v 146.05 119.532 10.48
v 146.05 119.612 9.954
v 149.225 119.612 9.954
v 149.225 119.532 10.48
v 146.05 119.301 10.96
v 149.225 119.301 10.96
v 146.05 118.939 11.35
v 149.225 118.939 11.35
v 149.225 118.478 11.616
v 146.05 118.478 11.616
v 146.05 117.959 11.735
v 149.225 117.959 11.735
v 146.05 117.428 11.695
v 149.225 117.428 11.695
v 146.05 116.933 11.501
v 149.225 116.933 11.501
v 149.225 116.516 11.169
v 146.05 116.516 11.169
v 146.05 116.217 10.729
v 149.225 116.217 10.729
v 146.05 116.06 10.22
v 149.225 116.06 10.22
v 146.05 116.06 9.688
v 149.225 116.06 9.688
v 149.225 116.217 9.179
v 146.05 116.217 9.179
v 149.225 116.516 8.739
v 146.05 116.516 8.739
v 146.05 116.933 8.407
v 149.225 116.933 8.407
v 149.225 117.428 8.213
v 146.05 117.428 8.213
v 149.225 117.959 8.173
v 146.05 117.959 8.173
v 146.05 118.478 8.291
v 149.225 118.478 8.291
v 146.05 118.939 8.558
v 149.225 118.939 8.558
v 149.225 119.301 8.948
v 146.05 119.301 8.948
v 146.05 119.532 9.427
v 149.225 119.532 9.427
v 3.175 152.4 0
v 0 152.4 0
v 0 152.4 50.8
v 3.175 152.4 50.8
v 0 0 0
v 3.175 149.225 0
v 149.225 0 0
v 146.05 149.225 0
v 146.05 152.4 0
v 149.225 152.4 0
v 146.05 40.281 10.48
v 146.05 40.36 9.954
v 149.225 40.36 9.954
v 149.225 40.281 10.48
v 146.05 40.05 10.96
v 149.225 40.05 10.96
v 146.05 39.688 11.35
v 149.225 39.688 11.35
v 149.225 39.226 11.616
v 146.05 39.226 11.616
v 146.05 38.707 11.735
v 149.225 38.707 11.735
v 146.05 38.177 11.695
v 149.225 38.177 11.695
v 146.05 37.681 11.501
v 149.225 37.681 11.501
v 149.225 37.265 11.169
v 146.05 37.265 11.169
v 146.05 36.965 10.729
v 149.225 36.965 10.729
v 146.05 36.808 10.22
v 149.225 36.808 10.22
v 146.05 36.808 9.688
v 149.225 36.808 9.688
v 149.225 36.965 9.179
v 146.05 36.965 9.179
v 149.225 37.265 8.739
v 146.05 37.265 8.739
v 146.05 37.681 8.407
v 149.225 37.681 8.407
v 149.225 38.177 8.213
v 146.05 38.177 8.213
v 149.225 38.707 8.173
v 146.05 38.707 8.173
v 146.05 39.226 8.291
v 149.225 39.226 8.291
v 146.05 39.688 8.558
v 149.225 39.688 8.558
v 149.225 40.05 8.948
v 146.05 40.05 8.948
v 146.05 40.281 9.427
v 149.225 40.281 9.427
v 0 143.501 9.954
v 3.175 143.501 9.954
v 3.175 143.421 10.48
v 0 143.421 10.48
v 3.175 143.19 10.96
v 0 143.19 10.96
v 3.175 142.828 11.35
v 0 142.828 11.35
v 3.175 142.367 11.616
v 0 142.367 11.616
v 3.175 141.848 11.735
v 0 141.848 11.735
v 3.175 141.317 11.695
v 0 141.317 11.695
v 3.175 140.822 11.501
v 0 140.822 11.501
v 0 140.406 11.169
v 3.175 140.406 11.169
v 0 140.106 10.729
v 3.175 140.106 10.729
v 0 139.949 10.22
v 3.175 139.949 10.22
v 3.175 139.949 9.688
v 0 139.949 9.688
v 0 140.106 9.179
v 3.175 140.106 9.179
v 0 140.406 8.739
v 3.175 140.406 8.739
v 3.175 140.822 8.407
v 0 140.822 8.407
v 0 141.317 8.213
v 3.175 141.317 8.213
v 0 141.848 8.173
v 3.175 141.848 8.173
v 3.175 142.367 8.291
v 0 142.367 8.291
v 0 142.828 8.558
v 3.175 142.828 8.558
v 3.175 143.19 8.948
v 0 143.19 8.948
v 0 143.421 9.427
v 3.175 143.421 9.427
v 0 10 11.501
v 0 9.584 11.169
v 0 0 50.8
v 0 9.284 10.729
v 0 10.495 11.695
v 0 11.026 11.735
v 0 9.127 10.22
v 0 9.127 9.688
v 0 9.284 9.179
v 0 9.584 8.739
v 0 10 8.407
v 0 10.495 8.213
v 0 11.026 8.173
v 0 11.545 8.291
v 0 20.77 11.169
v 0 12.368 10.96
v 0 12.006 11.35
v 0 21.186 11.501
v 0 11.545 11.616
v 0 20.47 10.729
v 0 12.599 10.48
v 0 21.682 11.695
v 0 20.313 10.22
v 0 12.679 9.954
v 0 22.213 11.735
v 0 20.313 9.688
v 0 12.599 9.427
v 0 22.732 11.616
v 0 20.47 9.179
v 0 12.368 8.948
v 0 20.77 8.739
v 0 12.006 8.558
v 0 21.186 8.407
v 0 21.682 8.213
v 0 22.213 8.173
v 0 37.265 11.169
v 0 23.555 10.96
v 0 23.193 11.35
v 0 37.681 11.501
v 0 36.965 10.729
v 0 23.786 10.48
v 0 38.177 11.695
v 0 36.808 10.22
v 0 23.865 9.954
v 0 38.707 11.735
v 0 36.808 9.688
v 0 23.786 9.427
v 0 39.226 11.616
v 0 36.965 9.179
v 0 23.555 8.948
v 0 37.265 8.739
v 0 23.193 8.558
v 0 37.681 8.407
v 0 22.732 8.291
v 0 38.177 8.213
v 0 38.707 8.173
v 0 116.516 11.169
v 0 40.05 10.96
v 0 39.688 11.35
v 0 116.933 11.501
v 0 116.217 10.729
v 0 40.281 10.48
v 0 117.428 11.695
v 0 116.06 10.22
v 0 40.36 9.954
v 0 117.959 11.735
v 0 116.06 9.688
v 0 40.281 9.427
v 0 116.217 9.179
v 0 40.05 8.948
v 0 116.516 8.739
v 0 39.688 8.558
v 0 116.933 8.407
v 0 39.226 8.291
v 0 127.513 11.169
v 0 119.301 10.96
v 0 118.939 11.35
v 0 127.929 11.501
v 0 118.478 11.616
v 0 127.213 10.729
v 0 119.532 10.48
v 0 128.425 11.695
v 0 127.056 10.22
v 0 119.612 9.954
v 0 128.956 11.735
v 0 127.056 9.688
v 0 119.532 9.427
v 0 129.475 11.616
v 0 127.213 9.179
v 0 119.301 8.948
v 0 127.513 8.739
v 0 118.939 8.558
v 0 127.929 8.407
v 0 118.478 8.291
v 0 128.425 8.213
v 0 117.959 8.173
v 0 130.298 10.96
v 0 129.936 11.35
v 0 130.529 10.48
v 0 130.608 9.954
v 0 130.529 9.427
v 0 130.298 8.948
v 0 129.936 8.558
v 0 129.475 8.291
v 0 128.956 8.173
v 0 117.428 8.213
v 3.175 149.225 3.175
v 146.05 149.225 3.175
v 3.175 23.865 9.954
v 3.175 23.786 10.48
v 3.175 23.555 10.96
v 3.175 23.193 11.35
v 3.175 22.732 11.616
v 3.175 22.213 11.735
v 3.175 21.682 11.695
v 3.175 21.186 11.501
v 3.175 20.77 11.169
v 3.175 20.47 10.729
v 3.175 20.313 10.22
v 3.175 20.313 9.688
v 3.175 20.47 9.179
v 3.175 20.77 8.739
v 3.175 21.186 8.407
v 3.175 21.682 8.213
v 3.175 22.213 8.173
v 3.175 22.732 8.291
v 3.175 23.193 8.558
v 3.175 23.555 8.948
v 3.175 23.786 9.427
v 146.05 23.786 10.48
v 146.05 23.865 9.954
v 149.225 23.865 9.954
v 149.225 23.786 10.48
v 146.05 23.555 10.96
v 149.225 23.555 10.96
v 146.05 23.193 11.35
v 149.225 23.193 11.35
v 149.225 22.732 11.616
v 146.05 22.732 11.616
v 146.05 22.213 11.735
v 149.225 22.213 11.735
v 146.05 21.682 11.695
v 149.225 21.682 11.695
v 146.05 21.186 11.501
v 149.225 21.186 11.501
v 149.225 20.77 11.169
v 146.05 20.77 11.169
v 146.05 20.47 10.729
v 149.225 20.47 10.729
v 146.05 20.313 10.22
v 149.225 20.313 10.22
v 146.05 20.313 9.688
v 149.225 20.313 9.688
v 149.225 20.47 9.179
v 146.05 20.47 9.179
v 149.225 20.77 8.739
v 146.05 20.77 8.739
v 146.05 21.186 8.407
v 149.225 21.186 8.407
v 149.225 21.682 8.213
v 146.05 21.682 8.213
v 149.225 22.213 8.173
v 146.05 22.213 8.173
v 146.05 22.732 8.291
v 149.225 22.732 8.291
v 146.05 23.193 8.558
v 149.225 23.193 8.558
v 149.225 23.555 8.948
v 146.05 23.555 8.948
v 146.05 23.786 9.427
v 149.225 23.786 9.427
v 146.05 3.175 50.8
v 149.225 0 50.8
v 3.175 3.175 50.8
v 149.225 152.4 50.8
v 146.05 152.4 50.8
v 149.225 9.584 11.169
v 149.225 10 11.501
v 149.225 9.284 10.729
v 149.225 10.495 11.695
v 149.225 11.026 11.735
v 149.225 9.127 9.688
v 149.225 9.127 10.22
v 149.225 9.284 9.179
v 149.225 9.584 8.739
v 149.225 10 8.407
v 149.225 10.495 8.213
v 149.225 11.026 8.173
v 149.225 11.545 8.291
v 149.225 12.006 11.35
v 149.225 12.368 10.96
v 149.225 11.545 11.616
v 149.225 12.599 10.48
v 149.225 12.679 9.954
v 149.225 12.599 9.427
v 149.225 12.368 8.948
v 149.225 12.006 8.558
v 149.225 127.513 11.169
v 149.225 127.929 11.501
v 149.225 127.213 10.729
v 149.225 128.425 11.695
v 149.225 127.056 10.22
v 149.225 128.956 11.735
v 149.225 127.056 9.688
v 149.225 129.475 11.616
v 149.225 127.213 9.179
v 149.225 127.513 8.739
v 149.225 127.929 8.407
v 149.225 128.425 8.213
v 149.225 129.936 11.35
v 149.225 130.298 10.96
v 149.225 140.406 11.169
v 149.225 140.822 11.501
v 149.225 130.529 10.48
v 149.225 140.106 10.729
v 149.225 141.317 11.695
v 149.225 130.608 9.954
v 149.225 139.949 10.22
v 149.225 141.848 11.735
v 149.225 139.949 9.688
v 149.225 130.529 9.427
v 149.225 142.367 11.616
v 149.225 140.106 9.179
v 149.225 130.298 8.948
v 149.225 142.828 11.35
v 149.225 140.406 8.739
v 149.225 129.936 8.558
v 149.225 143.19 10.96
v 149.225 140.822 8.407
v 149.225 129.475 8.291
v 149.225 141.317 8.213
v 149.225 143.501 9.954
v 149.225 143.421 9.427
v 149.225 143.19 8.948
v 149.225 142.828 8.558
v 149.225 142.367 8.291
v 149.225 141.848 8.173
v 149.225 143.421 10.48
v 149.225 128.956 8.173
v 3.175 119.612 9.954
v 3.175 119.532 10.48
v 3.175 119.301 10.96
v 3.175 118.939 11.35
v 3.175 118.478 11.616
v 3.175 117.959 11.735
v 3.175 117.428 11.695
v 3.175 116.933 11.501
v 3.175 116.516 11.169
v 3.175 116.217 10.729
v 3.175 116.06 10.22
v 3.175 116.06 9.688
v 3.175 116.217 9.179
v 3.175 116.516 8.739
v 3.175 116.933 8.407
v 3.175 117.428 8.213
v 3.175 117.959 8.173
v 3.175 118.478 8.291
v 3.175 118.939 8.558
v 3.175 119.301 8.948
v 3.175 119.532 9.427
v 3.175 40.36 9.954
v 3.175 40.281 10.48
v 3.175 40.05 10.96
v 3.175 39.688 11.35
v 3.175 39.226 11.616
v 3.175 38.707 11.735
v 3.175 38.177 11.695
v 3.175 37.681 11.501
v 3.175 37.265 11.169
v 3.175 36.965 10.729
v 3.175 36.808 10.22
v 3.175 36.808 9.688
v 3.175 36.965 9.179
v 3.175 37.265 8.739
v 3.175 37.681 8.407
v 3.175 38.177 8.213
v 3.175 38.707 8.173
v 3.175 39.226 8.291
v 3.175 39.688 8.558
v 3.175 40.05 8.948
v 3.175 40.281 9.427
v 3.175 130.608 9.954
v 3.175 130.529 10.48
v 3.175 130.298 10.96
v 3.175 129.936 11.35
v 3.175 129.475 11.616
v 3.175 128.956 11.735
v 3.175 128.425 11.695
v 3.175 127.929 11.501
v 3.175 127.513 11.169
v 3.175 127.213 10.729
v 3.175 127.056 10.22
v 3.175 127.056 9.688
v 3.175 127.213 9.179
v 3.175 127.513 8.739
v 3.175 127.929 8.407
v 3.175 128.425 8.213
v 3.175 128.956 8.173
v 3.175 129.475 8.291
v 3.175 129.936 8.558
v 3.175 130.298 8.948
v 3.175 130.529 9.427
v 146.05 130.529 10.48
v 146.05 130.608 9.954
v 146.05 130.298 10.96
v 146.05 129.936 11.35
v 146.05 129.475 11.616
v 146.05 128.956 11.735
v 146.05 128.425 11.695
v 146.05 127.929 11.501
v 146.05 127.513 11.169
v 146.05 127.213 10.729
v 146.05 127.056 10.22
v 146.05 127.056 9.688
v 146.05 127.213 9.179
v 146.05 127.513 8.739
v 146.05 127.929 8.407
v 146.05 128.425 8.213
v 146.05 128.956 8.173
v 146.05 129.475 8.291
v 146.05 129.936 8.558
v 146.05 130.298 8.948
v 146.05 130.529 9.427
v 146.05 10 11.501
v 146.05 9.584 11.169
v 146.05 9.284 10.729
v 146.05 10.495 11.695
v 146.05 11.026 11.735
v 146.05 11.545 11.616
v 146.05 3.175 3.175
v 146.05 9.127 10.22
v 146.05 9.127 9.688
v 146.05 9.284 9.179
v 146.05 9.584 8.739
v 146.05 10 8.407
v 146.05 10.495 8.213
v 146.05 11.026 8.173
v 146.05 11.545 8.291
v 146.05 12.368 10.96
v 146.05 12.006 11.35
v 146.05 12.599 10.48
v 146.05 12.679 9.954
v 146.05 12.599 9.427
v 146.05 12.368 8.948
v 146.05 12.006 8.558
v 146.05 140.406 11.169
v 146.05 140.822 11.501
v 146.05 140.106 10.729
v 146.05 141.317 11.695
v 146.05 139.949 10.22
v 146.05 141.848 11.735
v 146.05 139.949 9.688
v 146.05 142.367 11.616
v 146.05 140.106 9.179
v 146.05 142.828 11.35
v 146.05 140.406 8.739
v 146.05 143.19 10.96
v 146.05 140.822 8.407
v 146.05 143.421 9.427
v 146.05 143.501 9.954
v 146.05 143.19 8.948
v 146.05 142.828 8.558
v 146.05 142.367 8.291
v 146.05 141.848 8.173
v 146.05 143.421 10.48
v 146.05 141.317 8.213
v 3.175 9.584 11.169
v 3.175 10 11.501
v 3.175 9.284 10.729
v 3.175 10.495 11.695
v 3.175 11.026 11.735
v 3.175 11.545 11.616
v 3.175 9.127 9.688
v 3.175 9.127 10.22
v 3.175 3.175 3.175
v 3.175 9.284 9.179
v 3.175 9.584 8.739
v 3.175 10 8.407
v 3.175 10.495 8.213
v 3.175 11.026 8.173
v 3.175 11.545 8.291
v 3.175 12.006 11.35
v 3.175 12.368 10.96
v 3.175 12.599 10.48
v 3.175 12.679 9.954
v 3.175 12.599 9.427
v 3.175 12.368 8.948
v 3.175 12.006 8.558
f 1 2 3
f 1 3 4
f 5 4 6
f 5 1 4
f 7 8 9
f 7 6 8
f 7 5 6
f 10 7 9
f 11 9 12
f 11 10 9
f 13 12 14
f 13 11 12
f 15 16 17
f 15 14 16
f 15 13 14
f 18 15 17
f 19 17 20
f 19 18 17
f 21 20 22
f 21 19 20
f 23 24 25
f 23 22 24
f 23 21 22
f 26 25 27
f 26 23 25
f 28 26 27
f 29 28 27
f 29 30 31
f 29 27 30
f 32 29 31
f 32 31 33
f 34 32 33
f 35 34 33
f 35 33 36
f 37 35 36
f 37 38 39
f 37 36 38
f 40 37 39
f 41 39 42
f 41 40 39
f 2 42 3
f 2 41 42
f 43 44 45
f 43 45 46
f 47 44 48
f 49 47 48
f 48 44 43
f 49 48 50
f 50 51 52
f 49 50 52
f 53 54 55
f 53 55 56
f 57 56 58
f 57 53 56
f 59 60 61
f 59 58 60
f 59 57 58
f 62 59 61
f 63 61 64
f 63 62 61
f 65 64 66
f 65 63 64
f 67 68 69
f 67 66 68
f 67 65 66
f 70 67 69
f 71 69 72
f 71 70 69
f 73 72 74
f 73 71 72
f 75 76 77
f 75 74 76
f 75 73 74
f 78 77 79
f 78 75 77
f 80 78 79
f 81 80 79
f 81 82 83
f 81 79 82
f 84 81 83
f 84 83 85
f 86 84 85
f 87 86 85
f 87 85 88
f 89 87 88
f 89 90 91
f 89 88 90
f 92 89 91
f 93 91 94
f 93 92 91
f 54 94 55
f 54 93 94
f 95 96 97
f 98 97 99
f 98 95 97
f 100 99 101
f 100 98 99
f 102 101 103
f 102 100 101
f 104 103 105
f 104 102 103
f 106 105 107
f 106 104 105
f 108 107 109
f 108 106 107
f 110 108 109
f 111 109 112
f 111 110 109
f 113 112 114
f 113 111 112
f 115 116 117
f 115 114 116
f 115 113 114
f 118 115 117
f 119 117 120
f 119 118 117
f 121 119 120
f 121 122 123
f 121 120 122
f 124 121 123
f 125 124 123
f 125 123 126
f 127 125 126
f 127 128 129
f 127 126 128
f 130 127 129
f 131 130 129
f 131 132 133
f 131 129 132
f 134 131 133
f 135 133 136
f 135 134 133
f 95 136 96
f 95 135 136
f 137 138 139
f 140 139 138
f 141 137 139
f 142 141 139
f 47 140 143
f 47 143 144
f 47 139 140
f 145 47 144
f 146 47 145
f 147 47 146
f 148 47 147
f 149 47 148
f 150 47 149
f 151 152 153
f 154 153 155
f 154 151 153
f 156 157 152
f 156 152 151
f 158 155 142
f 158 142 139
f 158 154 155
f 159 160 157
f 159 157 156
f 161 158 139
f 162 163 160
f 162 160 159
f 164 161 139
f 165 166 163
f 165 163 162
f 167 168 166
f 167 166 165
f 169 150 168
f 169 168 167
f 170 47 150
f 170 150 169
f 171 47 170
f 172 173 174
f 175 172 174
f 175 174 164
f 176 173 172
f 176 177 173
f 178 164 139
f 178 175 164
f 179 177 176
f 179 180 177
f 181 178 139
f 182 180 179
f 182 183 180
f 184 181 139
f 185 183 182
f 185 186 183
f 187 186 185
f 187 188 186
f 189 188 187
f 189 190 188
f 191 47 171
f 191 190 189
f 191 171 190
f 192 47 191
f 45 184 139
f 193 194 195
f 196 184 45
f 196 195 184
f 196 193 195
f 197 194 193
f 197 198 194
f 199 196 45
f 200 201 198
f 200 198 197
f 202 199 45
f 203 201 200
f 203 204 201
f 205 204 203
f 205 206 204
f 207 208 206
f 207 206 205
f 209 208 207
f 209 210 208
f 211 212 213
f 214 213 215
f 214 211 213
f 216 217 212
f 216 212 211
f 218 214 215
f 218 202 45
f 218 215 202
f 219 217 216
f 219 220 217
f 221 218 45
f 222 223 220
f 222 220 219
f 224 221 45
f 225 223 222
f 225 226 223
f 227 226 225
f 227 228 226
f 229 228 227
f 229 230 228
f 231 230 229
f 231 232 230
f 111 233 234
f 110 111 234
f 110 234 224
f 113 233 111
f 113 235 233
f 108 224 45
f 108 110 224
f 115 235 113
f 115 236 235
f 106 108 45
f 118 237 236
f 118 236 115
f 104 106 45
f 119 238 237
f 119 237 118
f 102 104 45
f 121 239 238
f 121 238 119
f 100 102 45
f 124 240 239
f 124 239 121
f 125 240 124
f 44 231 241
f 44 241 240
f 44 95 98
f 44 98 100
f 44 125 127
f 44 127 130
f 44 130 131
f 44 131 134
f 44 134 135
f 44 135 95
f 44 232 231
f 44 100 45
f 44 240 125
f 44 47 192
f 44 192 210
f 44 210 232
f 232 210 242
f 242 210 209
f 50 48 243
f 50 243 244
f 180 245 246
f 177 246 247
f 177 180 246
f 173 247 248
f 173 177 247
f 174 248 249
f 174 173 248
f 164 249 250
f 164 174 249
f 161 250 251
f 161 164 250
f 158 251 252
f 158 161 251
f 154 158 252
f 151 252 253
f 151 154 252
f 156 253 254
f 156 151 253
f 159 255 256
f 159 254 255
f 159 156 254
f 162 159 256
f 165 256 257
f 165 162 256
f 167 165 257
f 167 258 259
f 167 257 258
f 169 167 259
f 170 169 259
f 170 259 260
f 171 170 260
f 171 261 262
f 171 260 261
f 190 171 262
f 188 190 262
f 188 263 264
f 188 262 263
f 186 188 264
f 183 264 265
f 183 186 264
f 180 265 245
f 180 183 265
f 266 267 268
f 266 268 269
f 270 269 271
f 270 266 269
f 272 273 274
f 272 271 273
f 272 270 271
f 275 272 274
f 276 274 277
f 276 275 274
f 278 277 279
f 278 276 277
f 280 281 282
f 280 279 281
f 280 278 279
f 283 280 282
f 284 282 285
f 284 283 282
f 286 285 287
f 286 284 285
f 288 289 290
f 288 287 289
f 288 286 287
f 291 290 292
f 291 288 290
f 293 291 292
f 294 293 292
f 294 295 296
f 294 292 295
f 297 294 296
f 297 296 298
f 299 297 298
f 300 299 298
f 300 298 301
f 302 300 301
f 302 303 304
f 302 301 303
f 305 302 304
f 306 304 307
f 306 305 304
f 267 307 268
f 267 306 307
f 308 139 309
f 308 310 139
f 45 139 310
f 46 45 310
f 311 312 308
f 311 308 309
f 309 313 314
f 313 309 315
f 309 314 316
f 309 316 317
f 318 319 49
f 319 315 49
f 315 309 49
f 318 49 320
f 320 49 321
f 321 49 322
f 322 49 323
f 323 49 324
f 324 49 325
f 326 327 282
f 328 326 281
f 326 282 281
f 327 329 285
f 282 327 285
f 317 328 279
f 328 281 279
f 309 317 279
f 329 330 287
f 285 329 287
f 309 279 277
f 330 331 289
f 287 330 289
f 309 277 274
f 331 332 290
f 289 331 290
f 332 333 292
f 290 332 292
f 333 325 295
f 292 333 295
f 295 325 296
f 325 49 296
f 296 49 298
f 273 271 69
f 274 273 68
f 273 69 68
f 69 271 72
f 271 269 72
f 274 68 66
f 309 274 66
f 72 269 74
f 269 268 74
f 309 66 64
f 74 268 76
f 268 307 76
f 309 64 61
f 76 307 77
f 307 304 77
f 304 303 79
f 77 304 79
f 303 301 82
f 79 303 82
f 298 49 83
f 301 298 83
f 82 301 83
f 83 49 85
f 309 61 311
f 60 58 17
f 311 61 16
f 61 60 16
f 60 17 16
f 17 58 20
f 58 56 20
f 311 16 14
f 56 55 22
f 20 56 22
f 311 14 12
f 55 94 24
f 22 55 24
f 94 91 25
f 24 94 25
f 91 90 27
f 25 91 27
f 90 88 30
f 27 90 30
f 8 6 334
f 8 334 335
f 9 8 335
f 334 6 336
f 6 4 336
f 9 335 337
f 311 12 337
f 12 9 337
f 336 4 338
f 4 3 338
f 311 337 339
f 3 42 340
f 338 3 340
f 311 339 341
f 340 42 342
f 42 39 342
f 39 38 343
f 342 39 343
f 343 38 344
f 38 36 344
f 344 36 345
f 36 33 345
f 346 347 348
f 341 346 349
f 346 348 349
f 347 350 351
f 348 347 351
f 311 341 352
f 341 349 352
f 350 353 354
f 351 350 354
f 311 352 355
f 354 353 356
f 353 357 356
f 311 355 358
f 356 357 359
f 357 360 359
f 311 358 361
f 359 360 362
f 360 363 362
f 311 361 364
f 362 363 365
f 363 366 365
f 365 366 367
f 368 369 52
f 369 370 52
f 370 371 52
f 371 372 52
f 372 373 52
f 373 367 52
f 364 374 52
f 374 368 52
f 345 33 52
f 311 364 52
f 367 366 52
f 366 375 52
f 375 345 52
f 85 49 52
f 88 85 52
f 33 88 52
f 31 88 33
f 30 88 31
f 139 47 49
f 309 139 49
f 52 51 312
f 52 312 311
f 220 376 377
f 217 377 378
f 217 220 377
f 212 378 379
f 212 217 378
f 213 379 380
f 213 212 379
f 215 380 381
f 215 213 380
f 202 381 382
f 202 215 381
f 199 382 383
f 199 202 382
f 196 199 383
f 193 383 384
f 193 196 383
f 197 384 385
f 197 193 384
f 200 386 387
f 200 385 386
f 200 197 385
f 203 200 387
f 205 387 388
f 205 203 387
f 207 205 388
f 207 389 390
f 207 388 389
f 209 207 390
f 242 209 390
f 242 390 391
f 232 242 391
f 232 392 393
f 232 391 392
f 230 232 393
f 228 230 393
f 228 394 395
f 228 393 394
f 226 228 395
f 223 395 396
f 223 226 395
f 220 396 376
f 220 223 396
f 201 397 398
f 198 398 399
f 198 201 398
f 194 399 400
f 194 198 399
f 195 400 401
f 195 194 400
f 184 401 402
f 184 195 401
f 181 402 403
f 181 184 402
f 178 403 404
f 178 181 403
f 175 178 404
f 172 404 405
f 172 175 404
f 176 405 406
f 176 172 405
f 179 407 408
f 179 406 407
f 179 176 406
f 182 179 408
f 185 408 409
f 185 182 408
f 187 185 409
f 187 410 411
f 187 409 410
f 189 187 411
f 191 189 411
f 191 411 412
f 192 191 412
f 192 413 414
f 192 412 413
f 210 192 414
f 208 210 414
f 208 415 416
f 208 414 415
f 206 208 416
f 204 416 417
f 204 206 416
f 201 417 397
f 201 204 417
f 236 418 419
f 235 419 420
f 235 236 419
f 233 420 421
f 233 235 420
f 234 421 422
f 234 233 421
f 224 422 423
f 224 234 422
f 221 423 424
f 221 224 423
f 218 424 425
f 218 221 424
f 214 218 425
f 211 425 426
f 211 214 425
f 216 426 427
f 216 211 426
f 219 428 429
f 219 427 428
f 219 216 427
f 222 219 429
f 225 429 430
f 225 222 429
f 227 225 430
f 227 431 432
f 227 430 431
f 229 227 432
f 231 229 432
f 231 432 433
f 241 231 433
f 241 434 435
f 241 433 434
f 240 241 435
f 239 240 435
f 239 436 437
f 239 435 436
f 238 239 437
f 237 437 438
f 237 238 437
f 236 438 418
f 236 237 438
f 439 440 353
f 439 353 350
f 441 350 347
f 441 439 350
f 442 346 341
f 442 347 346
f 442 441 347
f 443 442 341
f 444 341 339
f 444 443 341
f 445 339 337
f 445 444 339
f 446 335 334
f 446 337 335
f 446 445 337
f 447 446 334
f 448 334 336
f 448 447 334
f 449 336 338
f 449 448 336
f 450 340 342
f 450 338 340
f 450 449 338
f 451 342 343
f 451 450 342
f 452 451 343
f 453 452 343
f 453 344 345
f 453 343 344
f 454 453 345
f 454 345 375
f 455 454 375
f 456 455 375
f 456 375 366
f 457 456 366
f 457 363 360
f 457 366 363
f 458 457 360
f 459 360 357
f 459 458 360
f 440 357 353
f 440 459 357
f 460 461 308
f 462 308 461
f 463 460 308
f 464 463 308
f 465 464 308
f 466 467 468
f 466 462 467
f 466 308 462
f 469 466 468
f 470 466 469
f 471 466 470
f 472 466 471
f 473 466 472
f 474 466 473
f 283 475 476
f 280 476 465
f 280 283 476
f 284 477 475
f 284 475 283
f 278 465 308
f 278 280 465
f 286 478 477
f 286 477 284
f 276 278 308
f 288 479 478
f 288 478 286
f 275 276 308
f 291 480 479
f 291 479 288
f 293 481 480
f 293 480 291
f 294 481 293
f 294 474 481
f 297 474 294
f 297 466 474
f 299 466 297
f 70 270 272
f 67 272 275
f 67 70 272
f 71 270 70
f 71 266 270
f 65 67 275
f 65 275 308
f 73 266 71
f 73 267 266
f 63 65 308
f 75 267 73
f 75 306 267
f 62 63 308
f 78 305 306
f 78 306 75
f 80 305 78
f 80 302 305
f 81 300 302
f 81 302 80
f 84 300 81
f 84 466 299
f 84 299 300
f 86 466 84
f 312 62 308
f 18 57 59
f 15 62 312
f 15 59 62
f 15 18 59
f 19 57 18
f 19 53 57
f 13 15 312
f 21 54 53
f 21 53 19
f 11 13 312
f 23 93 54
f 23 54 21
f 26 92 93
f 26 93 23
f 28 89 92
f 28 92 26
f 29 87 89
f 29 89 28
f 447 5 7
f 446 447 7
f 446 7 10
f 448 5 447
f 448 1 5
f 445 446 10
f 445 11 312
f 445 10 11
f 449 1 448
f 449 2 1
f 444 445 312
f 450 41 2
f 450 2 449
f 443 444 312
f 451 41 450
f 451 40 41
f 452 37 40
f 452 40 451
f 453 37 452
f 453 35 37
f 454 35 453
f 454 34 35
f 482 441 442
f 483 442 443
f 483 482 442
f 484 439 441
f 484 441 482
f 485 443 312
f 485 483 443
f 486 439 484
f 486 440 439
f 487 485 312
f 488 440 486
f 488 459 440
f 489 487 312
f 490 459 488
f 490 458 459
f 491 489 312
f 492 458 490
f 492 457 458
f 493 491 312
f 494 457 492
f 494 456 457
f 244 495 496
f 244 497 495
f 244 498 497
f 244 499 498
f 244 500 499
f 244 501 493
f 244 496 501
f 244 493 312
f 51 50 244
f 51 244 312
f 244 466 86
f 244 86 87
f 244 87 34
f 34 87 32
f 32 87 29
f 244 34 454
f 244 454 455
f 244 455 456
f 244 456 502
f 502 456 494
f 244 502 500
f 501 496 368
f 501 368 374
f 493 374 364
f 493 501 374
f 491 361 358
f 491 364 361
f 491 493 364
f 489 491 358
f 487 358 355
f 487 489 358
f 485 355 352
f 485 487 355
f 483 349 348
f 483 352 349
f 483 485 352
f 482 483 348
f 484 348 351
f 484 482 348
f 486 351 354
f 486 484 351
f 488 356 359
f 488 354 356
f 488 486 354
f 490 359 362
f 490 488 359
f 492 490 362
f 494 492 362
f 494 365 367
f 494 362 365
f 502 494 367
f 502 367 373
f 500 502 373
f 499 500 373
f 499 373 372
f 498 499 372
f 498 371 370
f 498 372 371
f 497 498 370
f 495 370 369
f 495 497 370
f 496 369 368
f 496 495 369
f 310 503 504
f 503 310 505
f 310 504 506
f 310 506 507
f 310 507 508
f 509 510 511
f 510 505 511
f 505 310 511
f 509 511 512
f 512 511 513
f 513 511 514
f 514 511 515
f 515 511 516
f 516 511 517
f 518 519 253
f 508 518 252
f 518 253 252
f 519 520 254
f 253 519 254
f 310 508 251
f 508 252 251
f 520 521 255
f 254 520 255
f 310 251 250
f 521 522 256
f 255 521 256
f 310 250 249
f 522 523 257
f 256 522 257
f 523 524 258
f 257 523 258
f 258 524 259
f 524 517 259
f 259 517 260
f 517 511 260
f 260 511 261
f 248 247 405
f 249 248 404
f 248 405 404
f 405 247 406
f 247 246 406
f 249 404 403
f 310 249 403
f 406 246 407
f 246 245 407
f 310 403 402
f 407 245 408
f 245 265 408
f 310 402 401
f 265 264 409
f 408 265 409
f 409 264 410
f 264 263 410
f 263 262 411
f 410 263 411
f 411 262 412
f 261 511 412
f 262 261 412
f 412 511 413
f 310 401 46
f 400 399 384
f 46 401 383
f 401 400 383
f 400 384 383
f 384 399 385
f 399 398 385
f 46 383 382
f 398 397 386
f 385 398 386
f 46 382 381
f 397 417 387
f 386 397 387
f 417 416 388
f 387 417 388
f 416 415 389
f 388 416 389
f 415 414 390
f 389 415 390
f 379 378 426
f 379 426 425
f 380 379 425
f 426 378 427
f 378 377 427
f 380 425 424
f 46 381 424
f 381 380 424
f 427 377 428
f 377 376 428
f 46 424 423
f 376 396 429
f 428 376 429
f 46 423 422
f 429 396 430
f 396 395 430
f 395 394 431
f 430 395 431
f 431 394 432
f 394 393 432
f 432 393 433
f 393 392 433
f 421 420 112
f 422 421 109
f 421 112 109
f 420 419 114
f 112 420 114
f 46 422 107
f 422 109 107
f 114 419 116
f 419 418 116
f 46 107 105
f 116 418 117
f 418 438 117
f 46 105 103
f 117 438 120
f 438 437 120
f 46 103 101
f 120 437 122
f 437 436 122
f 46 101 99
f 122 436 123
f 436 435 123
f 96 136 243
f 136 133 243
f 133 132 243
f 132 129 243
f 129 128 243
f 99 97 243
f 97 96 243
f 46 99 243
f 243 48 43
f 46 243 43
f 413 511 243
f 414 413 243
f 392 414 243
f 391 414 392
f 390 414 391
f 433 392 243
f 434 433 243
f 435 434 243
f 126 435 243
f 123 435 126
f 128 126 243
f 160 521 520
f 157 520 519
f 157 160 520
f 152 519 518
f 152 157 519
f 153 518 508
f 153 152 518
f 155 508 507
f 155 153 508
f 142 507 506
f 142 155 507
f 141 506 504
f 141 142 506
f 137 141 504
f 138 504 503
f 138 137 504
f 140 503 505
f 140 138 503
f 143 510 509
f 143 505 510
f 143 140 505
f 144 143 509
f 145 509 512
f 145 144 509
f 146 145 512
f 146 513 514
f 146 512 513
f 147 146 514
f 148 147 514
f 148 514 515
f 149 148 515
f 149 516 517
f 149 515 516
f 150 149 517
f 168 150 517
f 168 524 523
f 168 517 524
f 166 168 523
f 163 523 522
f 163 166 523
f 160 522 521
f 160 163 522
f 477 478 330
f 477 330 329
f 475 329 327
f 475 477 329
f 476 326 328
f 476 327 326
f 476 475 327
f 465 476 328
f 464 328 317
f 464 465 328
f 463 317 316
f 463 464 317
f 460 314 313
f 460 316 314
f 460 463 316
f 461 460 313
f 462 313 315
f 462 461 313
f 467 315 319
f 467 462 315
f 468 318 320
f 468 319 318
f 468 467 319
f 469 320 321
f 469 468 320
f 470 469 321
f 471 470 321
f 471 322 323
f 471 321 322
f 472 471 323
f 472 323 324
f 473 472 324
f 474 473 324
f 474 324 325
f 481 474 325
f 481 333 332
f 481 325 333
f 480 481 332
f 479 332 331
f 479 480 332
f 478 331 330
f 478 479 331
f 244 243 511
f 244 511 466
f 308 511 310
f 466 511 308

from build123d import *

# Parameters (mm, degrees)
F0_W     = 149.225
F0_H     = 3.175
F1_DEPTH = 50.8
F0_H_2   = 146.05
F2_DEPTH = 3.175
F3_W     = 3.175
F3_H     = 152.4
F4_DEPTH = 50.8
F5_W     = 3.175
F5_H     = 152.4
F6_DEPTH = 50.8
F7_R     = 1.7859375
F8_DEPTH = 254


with BuildPart() as f1:
    # F0 (on Top) → F1 (new body)
    with BuildSketch(Plane.XY):
        with Locations((74.6125, 1.5875)):
            Rectangle(F0_W, F0_H)
    extrude(amount=F1_DEPTH)

    # F0 (on Top) → F2 (join)
    with BuildSketch(Plane.XY):
        with Locations((74.6125, 76.2)):
            Rectangle(F0_W, F0_H_2)
    extrude(amount=F2_DEPTH)

    # F3 (on Top) → F4 (join)
    with BuildSketch(Plane.XY):
        with Locations((1.5875, 76.2)):
            Rectangle(F3_W, F3_H)
    extrude(amount=F4_DEPTH)

    # F5 (on Top) → F6 (join)
    with BuildSketch(Plane.XY):
        with Locations((147.6375, 76.2)):
            Rectangle(F5_W, F5_H)
    extrude(amount=F6_DEPTH)

    # F7 (on Right) → F8 (cut)
    with BuildSketch(Plane.YZ):
        with Locations((10.8928065747, 9.9538508803)):
            Circle(F7_R)
        with Locations((22.0790393651, 9.9538508803)):
            Circle(F7_R)
        with Locations((38.5739915073, 9.9538508803)):
            Circle(F7_R)
        with Locations((141.7148411274, 9.9538508803)):
            Circle(F7_R)
        with Locations((128.8222372532, 9.9538508803)):
            Circle(F7_R)
        with Locations((117.8256049752, 9.9538508803)):
            Circle(F7_R)
    extrude(amount=F8_DEPTH, mode=Mode.SUBTRACT)


solid = f1.part
